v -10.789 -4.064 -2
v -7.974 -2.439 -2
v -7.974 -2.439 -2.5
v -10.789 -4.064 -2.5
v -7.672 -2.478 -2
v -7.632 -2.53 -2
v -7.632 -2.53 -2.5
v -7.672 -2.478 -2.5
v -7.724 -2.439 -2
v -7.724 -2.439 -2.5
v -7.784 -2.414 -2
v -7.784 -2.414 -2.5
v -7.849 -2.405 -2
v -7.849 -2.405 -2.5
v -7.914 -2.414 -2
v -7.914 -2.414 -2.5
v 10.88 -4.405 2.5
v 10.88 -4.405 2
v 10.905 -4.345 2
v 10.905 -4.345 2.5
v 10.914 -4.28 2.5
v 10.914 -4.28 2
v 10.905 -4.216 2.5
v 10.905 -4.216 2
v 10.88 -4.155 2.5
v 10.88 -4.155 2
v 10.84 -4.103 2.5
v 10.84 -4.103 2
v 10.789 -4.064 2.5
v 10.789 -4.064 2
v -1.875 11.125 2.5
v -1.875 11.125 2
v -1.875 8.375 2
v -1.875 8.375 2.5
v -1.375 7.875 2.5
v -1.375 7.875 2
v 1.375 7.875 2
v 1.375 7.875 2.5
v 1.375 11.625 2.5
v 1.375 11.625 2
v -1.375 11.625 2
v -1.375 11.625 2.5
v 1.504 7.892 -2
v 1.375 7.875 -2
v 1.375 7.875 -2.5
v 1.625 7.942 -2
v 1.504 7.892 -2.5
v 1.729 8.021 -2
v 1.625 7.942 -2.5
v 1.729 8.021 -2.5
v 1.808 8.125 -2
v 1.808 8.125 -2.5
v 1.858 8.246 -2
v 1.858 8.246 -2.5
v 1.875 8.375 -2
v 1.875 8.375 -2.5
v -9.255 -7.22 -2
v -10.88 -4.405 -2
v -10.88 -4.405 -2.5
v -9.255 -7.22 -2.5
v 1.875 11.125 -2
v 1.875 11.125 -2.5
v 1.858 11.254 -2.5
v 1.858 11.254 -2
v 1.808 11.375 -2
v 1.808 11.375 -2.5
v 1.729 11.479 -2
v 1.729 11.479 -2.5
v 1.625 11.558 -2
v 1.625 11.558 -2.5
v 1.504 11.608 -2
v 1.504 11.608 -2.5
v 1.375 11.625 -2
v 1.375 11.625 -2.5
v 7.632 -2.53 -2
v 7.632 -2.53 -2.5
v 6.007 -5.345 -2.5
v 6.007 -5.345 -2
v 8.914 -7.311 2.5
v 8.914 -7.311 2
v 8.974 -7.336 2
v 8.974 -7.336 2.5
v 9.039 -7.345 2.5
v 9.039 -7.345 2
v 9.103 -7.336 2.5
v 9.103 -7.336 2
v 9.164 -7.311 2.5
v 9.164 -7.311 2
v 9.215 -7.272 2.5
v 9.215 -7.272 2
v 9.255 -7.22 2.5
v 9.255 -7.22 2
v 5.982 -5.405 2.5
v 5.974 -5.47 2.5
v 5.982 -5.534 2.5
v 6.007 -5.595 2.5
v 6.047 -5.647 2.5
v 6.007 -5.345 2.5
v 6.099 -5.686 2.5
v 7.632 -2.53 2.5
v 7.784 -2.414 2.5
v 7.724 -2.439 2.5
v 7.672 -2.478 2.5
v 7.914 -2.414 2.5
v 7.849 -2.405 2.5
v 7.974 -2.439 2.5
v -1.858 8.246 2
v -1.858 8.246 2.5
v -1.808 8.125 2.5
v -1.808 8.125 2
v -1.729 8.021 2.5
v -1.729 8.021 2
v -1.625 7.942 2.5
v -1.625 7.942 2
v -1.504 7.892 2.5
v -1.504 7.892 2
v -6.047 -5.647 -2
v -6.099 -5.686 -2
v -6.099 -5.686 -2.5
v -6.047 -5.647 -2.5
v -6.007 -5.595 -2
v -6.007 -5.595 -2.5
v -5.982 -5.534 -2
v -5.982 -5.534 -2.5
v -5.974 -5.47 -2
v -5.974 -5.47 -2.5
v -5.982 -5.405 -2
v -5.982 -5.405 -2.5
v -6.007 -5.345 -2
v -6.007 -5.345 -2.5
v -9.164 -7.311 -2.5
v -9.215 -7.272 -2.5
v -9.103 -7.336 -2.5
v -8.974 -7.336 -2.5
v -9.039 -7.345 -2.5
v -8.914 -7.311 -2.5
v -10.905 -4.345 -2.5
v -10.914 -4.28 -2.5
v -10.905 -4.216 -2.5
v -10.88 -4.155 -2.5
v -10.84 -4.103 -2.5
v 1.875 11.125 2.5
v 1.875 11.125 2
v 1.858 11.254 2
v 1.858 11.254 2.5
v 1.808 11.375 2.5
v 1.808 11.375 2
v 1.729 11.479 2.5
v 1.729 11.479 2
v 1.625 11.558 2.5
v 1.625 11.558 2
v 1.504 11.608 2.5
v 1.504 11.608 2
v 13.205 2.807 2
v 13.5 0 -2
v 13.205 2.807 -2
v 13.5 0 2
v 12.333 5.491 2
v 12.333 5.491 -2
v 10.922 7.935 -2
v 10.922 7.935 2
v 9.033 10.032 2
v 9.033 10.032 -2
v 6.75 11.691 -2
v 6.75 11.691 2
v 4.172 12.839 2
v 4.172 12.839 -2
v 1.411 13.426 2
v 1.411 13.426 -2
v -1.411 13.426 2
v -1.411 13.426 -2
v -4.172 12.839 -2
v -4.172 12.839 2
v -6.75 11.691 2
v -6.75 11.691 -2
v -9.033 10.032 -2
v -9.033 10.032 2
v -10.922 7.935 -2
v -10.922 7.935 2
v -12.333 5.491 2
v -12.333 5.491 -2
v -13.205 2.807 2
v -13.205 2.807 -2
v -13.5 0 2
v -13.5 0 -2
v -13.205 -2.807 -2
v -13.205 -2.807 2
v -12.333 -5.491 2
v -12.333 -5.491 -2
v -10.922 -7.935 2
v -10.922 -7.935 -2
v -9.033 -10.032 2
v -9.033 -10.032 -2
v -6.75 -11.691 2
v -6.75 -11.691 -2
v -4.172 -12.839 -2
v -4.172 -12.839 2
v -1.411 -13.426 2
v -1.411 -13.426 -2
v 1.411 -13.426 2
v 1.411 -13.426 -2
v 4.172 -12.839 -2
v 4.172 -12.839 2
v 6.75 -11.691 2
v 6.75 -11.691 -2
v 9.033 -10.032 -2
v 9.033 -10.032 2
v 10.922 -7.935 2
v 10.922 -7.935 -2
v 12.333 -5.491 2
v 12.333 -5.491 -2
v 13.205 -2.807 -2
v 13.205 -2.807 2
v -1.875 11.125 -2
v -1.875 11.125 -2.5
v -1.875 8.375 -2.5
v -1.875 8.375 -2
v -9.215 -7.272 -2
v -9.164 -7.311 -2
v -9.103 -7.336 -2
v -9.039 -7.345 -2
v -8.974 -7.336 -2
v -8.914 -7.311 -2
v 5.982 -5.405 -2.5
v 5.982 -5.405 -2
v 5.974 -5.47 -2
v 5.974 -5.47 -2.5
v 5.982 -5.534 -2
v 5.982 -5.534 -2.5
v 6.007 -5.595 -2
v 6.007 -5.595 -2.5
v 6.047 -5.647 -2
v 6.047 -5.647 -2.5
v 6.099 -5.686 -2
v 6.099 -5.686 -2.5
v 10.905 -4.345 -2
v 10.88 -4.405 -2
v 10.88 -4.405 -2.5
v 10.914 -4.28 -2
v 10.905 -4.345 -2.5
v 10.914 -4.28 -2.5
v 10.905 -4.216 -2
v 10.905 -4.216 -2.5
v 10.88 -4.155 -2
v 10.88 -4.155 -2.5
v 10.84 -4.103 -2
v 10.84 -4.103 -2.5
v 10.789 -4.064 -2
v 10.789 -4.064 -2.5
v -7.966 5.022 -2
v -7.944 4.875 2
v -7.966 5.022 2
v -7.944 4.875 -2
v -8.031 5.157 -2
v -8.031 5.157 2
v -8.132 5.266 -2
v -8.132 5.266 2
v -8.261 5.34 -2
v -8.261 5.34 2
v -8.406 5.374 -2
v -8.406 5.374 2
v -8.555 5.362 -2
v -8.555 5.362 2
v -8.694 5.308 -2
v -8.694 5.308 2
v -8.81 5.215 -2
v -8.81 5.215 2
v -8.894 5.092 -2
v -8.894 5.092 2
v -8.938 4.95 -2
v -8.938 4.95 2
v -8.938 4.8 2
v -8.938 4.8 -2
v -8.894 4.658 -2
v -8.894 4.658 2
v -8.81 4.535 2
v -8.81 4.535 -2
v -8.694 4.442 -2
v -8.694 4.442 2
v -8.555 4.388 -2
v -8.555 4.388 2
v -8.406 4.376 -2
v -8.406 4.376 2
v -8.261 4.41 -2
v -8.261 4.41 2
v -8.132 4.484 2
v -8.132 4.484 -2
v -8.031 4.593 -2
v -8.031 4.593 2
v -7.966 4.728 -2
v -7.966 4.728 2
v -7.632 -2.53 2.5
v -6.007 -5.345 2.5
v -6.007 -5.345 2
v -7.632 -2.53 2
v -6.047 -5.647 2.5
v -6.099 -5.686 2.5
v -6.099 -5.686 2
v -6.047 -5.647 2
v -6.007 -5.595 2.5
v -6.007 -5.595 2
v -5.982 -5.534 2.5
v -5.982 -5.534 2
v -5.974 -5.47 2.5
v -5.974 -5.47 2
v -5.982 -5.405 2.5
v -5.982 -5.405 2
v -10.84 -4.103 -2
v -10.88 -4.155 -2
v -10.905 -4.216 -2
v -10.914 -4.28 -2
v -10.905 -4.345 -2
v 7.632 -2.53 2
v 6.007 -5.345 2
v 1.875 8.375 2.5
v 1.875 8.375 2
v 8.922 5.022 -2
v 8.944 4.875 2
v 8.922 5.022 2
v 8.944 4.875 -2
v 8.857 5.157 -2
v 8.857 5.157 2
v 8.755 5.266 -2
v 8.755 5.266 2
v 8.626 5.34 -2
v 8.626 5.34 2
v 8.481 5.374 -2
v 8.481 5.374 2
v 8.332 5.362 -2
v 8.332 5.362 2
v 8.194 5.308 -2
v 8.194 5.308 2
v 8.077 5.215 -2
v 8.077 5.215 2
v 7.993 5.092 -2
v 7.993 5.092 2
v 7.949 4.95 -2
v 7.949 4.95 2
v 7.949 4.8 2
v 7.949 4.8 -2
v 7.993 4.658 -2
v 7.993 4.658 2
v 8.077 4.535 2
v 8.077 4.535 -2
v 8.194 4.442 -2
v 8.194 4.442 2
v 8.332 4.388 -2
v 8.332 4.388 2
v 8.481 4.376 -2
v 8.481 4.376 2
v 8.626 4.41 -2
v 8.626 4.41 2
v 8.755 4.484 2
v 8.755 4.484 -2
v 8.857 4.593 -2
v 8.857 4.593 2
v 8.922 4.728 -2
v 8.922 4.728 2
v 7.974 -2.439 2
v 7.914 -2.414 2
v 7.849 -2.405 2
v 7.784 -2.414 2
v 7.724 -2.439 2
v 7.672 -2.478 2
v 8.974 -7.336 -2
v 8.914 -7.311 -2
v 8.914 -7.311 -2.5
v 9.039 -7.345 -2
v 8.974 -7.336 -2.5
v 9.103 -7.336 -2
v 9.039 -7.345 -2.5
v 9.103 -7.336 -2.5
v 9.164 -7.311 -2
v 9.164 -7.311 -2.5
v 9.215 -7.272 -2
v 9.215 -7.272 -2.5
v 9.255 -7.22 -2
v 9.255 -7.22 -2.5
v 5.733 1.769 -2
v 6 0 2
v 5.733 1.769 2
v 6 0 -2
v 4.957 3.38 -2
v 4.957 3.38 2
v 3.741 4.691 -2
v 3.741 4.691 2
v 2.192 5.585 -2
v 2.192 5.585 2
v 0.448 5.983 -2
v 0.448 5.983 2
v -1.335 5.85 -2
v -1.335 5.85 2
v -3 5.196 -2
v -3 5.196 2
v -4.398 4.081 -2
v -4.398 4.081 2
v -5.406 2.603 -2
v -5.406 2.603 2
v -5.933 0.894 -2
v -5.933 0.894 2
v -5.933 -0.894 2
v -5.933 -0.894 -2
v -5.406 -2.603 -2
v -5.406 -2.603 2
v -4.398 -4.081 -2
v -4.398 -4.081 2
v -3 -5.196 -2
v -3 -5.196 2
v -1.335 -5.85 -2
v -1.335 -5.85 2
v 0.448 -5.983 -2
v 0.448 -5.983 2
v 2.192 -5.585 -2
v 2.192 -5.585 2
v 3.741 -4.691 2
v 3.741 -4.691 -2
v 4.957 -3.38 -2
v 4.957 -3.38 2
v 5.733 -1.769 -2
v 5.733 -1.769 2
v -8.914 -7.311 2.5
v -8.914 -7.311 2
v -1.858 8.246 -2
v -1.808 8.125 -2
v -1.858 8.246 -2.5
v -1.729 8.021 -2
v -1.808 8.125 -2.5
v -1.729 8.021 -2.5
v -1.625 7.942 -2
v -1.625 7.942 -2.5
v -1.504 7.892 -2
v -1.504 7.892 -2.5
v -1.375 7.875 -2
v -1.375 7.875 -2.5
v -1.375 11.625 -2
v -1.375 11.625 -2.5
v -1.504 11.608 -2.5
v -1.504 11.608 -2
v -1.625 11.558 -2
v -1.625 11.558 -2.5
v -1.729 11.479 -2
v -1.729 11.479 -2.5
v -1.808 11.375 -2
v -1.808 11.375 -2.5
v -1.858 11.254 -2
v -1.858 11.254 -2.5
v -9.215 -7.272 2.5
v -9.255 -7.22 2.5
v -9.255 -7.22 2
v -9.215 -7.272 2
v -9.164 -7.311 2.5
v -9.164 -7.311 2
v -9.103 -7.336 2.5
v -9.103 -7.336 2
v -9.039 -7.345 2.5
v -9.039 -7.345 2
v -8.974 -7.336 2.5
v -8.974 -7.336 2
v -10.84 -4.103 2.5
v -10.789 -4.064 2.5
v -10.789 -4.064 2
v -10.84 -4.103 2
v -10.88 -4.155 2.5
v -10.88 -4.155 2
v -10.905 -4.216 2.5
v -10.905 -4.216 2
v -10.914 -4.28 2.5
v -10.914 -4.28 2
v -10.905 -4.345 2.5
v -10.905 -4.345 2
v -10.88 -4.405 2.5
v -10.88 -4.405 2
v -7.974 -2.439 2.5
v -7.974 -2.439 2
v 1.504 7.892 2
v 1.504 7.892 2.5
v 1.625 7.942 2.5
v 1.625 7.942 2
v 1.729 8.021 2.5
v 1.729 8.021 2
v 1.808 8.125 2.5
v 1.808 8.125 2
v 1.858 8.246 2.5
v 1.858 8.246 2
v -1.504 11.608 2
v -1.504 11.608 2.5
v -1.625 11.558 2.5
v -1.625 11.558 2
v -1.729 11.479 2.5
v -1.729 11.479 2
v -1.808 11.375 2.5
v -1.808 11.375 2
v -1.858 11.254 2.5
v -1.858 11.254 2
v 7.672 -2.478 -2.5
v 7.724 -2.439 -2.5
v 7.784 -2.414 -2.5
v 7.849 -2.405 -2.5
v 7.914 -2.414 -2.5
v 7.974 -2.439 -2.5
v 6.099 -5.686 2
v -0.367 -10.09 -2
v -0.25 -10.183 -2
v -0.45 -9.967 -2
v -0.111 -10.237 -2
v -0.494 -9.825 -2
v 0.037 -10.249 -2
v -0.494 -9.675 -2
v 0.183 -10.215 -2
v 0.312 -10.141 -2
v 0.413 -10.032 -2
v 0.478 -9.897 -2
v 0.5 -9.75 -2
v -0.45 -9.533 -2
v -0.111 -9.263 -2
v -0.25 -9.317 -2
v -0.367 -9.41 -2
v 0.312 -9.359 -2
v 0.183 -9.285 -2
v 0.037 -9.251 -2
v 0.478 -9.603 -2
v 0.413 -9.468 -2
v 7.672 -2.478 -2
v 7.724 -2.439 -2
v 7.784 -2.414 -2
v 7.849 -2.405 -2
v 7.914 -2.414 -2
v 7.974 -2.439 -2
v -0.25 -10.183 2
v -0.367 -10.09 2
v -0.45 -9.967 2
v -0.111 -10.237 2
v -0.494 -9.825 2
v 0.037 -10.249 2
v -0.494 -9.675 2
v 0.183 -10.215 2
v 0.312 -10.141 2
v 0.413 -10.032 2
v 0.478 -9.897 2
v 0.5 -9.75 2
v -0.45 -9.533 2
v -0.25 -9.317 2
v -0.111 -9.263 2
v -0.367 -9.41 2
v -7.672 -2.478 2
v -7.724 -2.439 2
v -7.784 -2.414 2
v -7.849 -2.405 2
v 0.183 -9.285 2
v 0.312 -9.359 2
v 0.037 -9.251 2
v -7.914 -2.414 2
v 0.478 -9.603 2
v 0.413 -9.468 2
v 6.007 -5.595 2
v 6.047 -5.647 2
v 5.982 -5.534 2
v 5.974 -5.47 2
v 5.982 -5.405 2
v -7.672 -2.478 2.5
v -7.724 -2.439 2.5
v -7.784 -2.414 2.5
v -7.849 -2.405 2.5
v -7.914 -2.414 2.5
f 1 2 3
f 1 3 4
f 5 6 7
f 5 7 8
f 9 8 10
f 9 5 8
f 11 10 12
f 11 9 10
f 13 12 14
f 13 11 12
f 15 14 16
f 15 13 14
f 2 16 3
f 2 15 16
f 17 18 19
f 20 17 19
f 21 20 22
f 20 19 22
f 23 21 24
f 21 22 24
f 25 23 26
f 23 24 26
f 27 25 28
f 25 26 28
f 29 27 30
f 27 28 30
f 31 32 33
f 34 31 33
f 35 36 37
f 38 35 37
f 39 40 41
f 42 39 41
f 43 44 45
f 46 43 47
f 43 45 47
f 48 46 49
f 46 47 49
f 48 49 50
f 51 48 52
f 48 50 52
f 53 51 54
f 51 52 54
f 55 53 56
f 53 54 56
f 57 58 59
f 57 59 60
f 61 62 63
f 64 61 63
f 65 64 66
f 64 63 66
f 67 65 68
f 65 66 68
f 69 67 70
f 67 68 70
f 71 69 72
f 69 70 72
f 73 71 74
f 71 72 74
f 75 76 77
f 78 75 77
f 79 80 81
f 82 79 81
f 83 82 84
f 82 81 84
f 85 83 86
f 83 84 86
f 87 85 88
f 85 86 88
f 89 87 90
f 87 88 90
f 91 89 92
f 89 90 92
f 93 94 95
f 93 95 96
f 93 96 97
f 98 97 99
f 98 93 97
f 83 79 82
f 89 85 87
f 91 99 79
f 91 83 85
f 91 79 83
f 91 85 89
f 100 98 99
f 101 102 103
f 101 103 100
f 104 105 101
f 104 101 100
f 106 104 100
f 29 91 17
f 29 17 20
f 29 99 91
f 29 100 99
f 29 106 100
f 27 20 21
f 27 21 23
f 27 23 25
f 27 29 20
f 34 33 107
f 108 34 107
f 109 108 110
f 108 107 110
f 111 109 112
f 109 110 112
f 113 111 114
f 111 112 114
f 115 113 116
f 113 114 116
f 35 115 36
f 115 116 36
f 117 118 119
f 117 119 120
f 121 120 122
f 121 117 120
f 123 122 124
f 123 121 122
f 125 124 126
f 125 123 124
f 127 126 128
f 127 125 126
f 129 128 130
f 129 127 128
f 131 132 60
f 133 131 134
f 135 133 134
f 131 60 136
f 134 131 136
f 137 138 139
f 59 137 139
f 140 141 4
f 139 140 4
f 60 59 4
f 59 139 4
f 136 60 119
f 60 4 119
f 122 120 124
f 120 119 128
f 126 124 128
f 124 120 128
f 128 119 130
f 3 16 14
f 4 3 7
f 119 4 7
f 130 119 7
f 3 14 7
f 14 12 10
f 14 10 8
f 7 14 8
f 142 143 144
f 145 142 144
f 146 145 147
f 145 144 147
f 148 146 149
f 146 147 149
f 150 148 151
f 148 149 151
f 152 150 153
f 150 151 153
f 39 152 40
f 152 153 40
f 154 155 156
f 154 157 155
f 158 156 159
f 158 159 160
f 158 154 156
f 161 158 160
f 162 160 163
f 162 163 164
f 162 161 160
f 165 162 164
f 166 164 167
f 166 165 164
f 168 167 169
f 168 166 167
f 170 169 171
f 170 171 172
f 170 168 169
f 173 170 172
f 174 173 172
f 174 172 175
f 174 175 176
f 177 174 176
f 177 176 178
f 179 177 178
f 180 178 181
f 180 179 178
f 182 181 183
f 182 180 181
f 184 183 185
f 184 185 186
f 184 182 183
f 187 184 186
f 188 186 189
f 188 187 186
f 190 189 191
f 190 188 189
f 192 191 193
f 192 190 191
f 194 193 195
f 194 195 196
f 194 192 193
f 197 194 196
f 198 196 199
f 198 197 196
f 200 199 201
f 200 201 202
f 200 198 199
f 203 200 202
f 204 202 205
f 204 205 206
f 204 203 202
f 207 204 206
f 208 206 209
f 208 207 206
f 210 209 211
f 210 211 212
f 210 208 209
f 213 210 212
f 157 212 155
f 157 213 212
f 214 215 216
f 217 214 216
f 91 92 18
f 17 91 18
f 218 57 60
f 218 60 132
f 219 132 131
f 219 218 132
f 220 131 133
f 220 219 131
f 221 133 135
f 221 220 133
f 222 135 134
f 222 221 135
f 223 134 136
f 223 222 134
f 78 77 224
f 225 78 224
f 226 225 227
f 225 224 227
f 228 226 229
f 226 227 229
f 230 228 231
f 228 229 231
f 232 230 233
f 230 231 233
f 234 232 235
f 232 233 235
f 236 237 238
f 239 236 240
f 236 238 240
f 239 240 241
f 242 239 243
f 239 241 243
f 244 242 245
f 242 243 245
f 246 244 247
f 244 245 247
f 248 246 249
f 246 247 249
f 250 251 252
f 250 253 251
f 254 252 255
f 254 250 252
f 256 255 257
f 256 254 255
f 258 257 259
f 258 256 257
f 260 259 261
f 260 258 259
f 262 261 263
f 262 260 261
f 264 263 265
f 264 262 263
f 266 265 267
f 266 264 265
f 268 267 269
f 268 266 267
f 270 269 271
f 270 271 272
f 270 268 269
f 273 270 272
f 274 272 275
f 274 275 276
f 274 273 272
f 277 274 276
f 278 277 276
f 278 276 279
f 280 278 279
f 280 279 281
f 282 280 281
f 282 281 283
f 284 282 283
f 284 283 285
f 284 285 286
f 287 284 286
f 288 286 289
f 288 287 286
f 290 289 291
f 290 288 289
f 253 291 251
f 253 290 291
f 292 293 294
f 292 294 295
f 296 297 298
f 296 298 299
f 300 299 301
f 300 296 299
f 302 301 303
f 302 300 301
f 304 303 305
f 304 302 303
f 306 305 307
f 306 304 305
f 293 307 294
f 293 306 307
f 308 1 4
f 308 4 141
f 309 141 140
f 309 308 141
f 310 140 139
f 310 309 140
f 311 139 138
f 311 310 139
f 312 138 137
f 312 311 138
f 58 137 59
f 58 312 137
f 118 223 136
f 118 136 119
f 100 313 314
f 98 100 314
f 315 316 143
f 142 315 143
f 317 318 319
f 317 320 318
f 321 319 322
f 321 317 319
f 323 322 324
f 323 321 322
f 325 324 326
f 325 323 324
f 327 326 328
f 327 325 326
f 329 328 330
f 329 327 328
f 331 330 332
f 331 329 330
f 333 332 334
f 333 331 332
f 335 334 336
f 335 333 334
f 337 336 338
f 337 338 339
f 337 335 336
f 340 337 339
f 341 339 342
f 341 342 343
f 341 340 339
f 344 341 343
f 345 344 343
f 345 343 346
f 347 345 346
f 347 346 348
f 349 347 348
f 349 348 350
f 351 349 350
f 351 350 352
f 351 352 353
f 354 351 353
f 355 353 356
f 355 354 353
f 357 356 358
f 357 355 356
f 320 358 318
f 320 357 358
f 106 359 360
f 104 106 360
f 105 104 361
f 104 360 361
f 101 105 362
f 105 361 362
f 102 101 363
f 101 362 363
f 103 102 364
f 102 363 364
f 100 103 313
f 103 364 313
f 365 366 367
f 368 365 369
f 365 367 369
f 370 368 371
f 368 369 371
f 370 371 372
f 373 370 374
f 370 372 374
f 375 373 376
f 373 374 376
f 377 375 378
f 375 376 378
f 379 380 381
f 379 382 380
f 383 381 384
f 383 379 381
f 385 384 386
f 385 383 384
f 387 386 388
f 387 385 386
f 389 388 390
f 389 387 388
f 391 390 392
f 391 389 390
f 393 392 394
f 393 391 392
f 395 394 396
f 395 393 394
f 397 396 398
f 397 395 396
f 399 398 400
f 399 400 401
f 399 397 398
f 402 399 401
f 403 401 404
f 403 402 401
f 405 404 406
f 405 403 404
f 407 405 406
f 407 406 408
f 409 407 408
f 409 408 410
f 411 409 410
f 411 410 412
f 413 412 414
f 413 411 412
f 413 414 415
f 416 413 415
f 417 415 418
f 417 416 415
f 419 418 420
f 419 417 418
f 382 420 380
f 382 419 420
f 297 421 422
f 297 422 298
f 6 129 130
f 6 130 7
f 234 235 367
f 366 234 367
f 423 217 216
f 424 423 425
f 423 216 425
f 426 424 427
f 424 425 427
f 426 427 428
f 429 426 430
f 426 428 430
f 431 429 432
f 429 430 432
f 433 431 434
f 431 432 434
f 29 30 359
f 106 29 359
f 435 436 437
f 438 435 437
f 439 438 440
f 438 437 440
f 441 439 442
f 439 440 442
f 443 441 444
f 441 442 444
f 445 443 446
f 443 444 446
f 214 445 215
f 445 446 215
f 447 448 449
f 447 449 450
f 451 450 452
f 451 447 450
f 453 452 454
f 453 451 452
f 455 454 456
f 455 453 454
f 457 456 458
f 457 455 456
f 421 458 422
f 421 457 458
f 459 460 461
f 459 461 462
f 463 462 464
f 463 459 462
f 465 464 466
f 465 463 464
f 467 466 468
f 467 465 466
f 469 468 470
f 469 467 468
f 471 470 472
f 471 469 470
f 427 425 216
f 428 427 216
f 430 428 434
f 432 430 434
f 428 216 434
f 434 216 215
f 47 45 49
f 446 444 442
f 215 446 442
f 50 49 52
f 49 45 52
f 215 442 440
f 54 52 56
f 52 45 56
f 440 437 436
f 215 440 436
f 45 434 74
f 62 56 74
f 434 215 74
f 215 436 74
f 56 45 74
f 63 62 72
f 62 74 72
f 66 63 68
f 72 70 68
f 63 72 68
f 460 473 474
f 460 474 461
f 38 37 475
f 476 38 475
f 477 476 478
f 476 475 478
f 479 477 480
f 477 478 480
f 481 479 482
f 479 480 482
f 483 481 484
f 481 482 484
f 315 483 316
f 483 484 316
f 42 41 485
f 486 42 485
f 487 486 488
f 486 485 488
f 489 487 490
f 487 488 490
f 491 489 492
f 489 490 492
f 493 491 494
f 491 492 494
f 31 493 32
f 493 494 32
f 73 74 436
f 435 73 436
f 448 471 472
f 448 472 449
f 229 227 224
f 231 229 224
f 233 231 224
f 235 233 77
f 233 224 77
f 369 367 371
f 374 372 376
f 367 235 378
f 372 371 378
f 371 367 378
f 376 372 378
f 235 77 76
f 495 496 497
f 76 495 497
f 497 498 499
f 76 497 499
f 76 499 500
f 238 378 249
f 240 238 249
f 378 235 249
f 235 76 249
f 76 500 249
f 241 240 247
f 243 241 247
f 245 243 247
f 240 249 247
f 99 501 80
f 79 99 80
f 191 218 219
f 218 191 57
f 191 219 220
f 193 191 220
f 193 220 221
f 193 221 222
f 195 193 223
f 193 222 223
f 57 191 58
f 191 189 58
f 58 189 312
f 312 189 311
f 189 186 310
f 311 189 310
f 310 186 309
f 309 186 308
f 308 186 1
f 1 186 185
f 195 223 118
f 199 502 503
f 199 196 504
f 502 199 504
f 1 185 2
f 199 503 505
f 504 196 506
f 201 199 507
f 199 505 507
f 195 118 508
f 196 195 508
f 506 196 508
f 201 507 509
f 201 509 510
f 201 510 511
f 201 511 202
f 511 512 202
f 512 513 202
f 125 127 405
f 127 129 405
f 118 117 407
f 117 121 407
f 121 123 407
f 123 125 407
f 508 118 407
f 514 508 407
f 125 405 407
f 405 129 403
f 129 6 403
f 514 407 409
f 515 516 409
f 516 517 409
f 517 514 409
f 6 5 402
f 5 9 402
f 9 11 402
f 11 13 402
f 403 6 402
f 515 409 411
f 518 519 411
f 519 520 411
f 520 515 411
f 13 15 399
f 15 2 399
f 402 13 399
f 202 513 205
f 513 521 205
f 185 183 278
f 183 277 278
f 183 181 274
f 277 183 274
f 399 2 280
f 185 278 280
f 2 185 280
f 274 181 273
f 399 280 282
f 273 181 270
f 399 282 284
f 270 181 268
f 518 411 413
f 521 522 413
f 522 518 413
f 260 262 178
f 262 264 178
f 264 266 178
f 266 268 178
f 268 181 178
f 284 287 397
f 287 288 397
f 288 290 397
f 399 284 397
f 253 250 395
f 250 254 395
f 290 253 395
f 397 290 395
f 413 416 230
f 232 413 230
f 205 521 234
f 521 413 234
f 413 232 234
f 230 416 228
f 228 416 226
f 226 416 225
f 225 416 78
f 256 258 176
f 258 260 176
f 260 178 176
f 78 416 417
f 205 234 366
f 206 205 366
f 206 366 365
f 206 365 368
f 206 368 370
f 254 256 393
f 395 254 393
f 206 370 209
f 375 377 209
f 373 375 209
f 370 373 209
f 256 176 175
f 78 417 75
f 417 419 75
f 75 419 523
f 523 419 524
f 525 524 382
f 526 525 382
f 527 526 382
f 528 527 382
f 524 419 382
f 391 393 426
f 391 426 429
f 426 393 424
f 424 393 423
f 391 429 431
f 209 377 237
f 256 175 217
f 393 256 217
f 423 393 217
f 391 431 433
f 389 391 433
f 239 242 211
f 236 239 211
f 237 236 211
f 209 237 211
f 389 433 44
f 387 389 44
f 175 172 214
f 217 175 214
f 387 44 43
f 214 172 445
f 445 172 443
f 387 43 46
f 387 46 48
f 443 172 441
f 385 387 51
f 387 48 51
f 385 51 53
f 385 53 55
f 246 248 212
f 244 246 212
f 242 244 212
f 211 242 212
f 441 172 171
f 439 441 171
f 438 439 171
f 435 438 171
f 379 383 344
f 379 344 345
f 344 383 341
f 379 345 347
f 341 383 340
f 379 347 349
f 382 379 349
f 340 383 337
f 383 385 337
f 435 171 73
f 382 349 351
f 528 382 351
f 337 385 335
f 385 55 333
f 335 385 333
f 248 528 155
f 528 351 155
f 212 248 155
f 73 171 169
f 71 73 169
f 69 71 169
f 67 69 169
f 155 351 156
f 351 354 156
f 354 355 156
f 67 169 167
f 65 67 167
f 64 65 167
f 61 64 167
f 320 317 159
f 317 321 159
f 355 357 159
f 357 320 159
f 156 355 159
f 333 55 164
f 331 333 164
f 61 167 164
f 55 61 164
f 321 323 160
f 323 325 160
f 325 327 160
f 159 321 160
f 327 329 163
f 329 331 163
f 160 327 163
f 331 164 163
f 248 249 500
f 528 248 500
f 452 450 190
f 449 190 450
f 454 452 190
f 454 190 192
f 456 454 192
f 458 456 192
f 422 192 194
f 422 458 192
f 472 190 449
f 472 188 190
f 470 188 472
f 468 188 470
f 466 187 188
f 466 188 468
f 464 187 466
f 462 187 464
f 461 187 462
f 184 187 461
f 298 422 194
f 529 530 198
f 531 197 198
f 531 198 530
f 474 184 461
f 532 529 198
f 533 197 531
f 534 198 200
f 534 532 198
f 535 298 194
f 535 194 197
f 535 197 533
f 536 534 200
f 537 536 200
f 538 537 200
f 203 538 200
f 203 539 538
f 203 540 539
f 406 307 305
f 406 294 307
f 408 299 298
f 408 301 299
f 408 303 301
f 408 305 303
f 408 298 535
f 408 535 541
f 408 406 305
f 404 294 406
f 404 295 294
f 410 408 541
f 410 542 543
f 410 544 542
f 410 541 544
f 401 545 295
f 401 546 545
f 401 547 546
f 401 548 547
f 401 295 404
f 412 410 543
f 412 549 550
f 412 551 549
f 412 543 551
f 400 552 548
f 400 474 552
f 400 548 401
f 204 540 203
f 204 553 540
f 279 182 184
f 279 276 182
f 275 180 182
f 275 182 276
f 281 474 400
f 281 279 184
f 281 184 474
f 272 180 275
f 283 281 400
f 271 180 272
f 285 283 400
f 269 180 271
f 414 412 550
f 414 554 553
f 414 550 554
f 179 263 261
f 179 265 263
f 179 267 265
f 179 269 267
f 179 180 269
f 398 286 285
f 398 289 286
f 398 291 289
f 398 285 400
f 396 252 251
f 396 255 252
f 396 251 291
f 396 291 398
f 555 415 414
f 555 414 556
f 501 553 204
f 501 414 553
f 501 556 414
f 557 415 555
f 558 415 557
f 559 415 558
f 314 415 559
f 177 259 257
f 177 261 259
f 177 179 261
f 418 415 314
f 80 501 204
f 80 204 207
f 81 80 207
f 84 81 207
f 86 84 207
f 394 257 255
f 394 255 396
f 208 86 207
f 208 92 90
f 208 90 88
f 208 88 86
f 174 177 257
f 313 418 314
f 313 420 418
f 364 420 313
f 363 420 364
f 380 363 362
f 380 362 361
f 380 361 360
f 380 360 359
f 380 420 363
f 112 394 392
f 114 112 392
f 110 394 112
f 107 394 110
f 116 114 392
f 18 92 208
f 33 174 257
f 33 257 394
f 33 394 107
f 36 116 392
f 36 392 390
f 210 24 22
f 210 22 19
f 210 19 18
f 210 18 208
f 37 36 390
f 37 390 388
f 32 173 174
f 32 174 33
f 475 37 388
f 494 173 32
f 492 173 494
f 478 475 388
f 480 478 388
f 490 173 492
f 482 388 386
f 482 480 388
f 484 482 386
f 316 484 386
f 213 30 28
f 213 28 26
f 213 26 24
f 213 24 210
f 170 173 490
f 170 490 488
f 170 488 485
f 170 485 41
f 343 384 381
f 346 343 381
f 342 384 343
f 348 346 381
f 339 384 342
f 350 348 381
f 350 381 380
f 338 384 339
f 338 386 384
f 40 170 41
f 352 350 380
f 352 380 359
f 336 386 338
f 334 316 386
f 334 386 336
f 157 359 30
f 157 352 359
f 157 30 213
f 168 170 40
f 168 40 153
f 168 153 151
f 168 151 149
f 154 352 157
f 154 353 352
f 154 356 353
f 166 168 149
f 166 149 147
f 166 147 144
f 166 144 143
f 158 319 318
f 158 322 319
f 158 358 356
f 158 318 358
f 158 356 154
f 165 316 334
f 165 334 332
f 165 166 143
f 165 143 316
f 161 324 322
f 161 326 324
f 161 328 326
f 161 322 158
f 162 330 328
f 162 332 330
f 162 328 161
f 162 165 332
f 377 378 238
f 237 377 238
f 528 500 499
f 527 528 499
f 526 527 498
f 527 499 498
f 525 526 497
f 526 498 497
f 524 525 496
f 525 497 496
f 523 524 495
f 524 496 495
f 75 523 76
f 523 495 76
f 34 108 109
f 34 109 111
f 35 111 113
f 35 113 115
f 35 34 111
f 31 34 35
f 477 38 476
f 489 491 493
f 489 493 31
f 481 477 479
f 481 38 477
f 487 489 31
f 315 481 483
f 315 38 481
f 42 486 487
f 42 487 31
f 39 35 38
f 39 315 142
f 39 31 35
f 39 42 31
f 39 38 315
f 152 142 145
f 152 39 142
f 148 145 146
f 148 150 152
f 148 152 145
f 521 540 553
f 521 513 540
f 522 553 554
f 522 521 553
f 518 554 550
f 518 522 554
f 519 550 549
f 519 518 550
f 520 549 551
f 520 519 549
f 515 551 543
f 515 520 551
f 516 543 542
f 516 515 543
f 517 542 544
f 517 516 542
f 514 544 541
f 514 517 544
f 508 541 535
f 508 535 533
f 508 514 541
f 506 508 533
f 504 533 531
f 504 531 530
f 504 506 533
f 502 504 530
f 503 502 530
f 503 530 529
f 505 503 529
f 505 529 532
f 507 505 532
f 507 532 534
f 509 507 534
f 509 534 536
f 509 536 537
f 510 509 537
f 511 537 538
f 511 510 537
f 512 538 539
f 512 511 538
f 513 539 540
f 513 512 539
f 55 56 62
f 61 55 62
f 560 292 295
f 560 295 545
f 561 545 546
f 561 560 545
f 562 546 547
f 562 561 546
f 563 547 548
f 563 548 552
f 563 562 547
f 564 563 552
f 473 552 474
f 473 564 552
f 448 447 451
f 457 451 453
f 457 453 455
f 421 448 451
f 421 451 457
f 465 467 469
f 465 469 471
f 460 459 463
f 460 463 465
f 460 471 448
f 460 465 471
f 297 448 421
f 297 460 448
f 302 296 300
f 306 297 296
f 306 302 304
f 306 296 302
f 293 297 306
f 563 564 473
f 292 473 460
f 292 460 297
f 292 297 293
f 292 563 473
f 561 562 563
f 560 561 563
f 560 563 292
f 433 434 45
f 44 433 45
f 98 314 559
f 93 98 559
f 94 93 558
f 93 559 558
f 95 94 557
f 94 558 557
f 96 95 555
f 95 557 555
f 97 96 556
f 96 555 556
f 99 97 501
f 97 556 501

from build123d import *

# Parameters (mm, degrees)
SKETCH2_R           = 13.5
SKETCH2_R_2         = 6
SKETCH2_R_3         = 0.5
BOSS_EXTRUDE2_DEPTH = 2
BOSS_EXTRUDE3_DEPTH = 2.5


with BuildPart() as part:
    # Sketch2 → Boss-Extrude2 (new, symmetric)
    with BuildSketch(Plane.XY):
        Circle(SKETCH2_R)
        Circle(SKETCH2_R_2, mode=Mode.SUBTRACT)
        with Locations((8.443747687, 4.875)):
            Circle(SKETCH2_R_3, mode=Mode.SUBTRACT)
        with Locations((0, -9.75)):
            Circle(SKETCH2_R_3, mode=Mode.SUBTRACT)
        with Locations((-8.443747687, 4.875)):
            Circle(SKETCH2_R_3, mode=Mode.SUBTRACT)
    extrude(amount=BOSS_EXTRUDE2_DEPTH, both=True)

    # Sketch3 → Boss-Extrude3 (add, symmetric)
    with BuildSketch(Plane.XY):
        with BuildLine():
            Line((7.632450055, -2.530208719), (6.007450055, -5.344791281))
            ThreePointArc((6.007450055, -5.344791281), (5.982474949, -5.534496042), (6.098956406, -5.686297632))
            Line((6.098956406, -5.686297632), (8.913538968, -7.311297632))
            ThreePointArc((8.913538968, -7.311297632), (9.103243729, -7.336272738), (9.255045319, -7.219791281))
            Line((9.255045319, -7.219791281), (10.880045319, -4.405208719))
            ThreePointArc((10.880045319, -4.405208719), (10.905020425, -4.215503958), (10.788538968, -4.063702368))
            Line((10.788538968, -4.063702368), (7.973956406, -2.438702368))
            ThreePointArc((7.973956406, -2.438702368), (7.784251644, -2.413727262), (7.632450055, -2.530208719))
        make_face()
        with BuildLine():
            Line((-1.375, 7.875), (1.375, 7.875))
            ThreePointArc((1.375, 7.875), (1.728553391, 8.021446609), (1.875, 8.375))
            Line((1.875, 8.375), (1.875, 11.125))
            ThreePointArc((1.875, 11.125), (1.728553391, 11.478553391), (1.375, 11.625))
            Line((1.375, 11.625), (-1.375, 11.625))
            ThreePointArc((-1.375, 11.625), (-1.728553391, 11.478553391), (-1.875, 11.125))
            Line((-1.875, 11.125), (-1.875, 8.375))
            ThreePointArc((-1.875, 8.375), (-1.728553391, 8.021446609), (-1.375, 7.875))
        make_face()
        with BuildLine():
            Line((-6.007450055, -5.344791281), (-7.632450055, -2.530208719))
            ThreePointArc((-7.632450055, -2.530208719), (-7.784251644, -2.413727262), (-7.973956406, -2.438702368))
            Line((-7.973956406, -2.438702368), (-10.788538968, -4.063702368))
            ThreePointArc((-10.788538968, -4.063702368), (-10.905020425, -4.215503958), (-10.880045319, -4.405208719))
            Line((-10.880045319, -4.405208719), (-9.255045319, -7.219791281))
            ThreePointArc((-9.255045319, -7.219791281), (-9.103243729, -7.336272738), (-8.913538968, -7.311297632))
            Line((-8.913538968, -7.311297632), (-6.098956406, -5.686297632))
            ThreePointArc((-6.098956406, -5.686297632), (-5.982474949, -5.534496042), (-6.007450055, -5.344791281))
        make_face()
    extrude(amount=BOSS_EXTRUDE3_DEPTH, both=True)


solid = part.part
